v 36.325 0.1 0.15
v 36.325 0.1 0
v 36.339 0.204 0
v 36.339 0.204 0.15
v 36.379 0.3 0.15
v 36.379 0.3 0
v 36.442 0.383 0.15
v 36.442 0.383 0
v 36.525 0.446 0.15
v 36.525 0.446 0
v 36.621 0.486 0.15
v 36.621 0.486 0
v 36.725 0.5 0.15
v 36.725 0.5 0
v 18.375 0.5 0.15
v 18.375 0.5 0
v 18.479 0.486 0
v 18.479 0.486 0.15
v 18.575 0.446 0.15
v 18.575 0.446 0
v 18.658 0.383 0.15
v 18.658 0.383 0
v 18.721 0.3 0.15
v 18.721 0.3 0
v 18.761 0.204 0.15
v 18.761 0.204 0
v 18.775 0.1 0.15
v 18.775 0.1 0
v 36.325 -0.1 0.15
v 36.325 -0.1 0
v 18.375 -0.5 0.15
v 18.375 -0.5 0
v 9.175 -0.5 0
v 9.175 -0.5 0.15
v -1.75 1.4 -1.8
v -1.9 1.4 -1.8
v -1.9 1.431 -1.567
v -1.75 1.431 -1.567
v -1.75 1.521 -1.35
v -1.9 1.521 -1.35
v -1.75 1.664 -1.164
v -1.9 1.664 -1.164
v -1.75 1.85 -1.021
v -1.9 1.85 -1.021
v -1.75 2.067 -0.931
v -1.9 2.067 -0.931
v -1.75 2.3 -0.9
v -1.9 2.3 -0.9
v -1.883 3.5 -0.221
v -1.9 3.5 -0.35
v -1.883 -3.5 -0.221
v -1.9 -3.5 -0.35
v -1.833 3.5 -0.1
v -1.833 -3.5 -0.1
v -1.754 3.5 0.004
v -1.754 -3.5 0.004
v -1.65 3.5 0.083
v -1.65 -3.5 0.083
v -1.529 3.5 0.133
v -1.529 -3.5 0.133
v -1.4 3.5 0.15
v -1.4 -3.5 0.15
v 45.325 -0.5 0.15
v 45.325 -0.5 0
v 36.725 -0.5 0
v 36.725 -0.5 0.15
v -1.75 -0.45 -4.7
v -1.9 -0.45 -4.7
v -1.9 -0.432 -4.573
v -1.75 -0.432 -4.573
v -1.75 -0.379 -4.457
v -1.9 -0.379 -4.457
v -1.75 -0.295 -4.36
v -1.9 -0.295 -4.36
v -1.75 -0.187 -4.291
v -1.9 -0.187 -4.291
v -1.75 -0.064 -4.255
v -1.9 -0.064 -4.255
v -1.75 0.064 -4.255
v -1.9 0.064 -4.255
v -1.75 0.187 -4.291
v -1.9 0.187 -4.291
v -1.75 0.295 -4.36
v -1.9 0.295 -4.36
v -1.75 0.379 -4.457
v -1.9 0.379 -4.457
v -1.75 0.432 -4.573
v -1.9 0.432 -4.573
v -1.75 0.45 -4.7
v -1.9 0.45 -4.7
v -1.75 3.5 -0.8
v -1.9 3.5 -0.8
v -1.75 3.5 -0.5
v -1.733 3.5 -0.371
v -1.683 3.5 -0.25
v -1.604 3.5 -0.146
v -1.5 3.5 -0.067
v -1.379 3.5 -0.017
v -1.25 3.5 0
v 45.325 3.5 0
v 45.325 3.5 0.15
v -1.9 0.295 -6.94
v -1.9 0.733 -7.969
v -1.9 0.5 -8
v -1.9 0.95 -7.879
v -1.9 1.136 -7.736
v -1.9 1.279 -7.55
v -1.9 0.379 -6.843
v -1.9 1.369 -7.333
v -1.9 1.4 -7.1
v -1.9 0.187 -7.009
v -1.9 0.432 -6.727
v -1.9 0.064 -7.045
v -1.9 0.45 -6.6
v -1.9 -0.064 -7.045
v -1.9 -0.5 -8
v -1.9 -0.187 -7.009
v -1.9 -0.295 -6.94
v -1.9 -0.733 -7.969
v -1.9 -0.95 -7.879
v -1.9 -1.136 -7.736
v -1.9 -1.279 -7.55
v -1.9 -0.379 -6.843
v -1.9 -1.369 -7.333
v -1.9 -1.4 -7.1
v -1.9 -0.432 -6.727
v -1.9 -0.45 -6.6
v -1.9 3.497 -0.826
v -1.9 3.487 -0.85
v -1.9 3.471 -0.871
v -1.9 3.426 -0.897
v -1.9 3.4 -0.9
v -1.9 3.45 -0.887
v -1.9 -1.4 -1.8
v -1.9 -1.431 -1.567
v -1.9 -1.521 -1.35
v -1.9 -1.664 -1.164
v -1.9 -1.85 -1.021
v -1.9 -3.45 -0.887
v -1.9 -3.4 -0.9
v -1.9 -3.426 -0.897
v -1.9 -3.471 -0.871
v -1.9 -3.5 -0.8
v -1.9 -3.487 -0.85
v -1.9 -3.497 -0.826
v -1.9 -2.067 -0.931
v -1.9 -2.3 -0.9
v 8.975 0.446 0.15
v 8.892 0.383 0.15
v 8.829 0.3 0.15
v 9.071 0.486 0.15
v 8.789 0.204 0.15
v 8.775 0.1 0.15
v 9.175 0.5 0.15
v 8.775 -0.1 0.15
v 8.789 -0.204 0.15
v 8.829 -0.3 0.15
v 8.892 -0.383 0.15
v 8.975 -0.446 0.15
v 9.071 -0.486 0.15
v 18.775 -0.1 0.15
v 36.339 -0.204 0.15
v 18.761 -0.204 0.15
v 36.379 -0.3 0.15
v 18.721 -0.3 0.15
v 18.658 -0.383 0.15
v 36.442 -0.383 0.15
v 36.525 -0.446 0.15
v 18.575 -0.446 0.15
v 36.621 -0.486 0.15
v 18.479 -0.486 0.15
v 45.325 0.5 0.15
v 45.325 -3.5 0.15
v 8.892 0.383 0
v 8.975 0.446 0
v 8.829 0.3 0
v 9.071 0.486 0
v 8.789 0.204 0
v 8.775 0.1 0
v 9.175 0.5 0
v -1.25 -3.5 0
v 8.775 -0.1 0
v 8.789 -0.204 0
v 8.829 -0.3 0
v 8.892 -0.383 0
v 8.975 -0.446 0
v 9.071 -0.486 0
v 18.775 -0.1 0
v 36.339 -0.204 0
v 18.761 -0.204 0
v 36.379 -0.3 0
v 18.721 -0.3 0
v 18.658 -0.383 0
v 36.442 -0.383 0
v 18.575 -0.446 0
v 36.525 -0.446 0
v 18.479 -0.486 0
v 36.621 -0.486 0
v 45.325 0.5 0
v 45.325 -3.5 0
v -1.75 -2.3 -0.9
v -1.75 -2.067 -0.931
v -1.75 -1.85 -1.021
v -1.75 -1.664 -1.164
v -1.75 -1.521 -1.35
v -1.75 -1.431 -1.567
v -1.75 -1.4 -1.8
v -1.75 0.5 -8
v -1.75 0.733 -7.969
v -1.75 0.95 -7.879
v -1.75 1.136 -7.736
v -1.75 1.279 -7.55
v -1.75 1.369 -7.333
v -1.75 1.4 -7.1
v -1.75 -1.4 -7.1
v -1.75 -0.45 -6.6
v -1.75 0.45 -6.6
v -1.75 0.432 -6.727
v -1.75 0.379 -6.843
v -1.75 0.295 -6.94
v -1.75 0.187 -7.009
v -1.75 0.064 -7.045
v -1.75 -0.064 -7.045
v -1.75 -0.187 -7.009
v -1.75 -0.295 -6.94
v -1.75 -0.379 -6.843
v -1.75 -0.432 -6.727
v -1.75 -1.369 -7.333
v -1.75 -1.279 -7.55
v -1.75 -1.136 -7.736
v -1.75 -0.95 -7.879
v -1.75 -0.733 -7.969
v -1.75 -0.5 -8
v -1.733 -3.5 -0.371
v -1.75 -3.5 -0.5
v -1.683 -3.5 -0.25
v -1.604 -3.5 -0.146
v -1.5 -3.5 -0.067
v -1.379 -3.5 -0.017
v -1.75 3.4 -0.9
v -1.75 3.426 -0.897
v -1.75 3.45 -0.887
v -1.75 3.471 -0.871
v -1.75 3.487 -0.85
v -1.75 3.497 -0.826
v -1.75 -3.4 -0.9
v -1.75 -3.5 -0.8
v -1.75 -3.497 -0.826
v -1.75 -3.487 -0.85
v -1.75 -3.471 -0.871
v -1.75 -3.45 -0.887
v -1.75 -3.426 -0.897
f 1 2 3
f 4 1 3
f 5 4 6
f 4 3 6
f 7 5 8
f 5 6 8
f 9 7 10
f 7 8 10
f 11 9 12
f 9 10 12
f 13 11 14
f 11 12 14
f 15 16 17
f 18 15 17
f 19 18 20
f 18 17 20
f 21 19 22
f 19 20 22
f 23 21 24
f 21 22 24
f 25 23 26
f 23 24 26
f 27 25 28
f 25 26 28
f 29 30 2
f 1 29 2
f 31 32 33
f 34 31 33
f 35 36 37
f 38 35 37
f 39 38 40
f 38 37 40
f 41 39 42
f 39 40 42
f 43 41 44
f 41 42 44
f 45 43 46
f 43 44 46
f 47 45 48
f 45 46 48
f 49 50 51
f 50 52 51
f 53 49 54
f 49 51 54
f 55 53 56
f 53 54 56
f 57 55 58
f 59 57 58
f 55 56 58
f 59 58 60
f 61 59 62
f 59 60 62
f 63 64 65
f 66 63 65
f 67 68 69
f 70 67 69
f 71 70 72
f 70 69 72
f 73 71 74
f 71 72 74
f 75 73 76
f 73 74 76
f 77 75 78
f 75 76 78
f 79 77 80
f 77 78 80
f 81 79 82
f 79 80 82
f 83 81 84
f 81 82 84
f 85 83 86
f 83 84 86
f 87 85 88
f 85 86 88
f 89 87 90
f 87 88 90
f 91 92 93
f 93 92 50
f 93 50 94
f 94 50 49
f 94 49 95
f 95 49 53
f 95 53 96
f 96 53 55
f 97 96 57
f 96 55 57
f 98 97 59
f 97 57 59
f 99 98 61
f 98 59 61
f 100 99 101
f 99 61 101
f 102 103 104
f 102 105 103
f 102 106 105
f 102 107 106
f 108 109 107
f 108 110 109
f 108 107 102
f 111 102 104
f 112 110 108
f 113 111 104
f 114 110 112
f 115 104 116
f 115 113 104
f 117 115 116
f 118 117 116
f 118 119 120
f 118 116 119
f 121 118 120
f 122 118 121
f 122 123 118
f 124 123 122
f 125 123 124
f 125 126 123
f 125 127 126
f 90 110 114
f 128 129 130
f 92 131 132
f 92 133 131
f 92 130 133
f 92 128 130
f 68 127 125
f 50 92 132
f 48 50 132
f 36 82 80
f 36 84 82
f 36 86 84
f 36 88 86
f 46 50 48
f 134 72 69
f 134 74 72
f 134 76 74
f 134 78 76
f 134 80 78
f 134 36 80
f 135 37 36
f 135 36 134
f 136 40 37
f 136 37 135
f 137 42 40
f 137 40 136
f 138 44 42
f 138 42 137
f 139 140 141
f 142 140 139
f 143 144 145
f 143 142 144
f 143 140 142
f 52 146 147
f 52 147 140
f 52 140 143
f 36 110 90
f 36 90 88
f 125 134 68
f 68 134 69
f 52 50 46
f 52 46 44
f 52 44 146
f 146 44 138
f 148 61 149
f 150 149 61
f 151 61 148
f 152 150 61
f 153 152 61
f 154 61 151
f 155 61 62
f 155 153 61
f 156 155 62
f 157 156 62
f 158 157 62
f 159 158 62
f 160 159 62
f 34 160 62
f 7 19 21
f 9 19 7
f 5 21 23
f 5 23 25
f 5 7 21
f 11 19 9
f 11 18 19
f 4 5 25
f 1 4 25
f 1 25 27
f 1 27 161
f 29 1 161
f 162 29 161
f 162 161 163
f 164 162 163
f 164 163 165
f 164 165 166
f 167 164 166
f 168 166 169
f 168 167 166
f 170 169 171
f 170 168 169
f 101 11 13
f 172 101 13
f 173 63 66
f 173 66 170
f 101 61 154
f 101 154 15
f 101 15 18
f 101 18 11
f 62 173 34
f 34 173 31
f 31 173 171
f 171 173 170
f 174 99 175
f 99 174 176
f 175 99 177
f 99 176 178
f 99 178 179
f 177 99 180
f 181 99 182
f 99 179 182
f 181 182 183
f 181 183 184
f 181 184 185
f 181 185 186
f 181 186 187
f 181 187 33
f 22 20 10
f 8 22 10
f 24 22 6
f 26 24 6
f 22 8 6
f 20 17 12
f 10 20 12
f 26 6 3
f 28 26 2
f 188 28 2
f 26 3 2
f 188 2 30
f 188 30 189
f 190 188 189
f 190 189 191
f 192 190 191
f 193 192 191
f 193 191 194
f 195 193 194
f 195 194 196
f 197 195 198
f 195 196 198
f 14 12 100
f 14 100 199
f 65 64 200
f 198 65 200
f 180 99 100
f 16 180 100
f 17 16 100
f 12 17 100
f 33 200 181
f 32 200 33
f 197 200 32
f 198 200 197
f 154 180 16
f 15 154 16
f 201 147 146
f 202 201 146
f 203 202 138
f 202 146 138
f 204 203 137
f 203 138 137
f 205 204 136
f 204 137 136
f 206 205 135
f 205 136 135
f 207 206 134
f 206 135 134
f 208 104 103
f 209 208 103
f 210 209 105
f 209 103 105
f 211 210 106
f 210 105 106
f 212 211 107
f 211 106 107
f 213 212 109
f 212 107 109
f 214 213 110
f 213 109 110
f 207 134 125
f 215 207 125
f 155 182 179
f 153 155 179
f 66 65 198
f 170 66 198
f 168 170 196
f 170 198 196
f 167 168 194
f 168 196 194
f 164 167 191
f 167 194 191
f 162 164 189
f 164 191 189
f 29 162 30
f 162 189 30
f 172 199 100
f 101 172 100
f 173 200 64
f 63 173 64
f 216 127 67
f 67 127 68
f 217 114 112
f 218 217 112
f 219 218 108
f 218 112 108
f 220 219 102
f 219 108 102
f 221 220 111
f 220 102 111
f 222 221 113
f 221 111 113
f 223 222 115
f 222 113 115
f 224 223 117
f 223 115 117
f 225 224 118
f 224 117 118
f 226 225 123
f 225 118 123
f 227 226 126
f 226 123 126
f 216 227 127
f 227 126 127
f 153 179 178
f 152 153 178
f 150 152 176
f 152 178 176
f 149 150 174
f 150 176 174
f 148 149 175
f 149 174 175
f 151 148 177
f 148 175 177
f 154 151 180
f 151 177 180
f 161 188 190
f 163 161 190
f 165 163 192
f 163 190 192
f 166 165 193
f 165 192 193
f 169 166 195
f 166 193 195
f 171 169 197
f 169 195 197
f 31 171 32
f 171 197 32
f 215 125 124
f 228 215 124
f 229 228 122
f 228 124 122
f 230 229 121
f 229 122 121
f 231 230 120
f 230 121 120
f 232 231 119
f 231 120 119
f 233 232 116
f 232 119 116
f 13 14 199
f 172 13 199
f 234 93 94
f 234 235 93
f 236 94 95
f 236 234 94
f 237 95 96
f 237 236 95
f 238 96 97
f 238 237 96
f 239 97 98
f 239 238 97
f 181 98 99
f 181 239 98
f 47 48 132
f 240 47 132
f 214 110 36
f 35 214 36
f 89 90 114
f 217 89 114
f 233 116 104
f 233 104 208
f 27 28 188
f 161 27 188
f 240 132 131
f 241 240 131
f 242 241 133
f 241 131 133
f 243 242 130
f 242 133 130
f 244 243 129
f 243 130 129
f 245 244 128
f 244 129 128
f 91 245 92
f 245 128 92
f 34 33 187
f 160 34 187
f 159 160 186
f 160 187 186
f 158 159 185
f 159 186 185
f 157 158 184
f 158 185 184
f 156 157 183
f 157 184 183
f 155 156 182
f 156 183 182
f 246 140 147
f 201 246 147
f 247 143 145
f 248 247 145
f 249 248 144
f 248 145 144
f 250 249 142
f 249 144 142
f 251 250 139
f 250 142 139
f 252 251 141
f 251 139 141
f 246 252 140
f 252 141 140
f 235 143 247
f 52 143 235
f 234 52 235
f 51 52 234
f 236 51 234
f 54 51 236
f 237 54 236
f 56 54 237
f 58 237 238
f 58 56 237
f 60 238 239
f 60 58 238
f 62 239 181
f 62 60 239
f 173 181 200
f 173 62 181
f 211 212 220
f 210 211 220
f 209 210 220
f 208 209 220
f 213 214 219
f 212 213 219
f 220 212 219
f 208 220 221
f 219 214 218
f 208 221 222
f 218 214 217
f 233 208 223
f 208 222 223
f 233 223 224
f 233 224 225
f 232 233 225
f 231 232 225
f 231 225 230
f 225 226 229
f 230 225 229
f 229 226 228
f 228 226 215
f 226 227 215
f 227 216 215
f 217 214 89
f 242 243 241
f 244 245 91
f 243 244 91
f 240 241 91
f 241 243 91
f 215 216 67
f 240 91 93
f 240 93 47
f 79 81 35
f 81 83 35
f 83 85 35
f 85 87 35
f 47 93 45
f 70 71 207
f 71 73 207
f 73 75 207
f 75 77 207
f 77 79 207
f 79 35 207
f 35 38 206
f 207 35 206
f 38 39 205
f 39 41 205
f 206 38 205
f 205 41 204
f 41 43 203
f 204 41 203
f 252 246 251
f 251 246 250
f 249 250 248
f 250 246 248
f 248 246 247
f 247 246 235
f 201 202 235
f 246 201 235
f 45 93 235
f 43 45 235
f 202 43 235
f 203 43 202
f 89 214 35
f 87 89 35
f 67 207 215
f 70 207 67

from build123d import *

# Parameters (mm, degrees)
F0_W     = 4
F0_H     = 3
F1_DEPTH = 0.15
F2_DEPTH = 1.9
F3_W     = 0.15
F3_H     = 7
F4_DEPTH = 8
F6_DEPTH = 25
F7_R     = 0.5


# Not quite as in the source:
# - a feature names something its author has since deleted; it is built from what else it names


with BuildPart() as f1:
    # F0 (on Top) → F1 (new body)
    with BuildSketch(Plane.XY):
        with BuildLine():
            Line((13.775, -0.5), (13.775, -3.5))
            Line((13.775, -3.5), (27.55, -3.5))
            Line((27.55, -3.5), (41.325, -3.5))
            Line((41.325, -3.5), (41.325, -0.5))
            Line((41.325, -0.5), (36.725, -0.5))
            ThreePointArc((36.725, -0.5), (36.4421572875, -0.3828427125), (36.325, -0.1))
            Line((36.325, -0.1), (36.325, 0.1))
            ThreePointArc((36.325, 0.1), (36.4421572875, 0.3828427125), (36.725, 0.5))
            Line((36.725, 0.5), (41.325, 0.5))
            Line((41.325, 0.5), (41.325, 3.5))
            Line((41.325, 3.5), (27.55, 3.5))
            Line((27.55, 3.5), (13.775, 3.5))
            Line((13.775, 3.5), (13.775, 0.5))
            Line((13.775, 0.5), (18.375, 0.5))
            ThreePointArc((18.375, 0.5), (18.6578427125, 0.3828427125), (18.775, 0.1))
            Line((18.775, 0.1), (18.775, -0.1))
            ThreePointArc((18.775, -0.1), (18.6578427125, -0.3828427125), (18.375, -0.5))
            Line((18.375, -0.5), (13.775, -0.5))
        make_face()
        with Locations((43.325, 2)):
            Rectangle(F0_W, F0_H)
        with BuildLine():
            Line((0, 3.5), (0, -3.5))
            Line((0, -3.5), (13.775, -3.5))
            Line((13.775, -3.5), (13.775, -0.5))
            Line((13.775, -0.5), (9.175, -0.5))
            ThreePointArc((9.175, -0.5), (8.8921572875, -0.3828427125), (8.775, -0.1))
            Line((8.775, -0.1), (8.775, 0.1))
            ThreePointArc((8.775, 0.1), (8.8921572875, 0.3828427125), (9.175, 0.5))
            Line((9.175, 0.5), (13.775, 0.5))
            Line((13.775, 0.5), (13.775, 3.5))
            Line((13.775, 3.5), (0, 3.5))
        make_face()
        with Locations((43.325, -2)):
            Rectangle(F0_W, F0_H)
    extrude(amount=F1_DEPTH)

    # F2 (add): a face of the model
    f2_faces = [f1.faces().sort_by_distance(p)[0] for p in [
        (0, 0, 0.075),
    ]]
    extrude(f2_faces, amount=F2_DEPTH)

    # F3 (on face) → F4 (join)
    with BuildSketch(Plane(origin=(0, 0, 0), x_dir=(1, 0, 0), z_dir=(0, 0, -1))):
        with Locations((-1.825, 0)):
            Rectangle(F3_W, F3_H)
    extrude(amount=F4_DEPTH)

    # F5 (on face) → F6 (cut)
    with BuildSketch(Plane(origin=(-1.9, 0, 0), x_dir=(0, -1, 0), z_dir=(-1, 0, 0))):
        with BuildLine():
            Line((-3.5, -8), (-0.5, -8))
            ThreePointArc((-0.5, -8), (-1.1363961031, -7.7363961031), (-1.4, -7.1))
            Line((-1.4, -7.1), (-1.4, -1.8))
            ThreePointArc((-1.4, -1.8), (-1.6636038969, -1.1636038969), (-2.3, -0.9))
            Line((-2.3, -0.9), (-3.4, -0.9))
            ThreePointArc((-3.4, -0.9), (-3.4707106781, -0.8707106781), (-3.5, -0.8))
            Line((-3.5, -0.8), (-3.5, -8))
        make_face()
        with BuildLine():
            ThreePointArc((1.4, -7.1), (1.1363961031, -7.7363961031), (0.5, -8))
            Line((0.5, -8), (3.5, -8))
            Line((3.5, -8), (3.5, -0.8))
            ThreePointArc((3.5, -0.8), (3.4707106781, -0.8707106781), (3.4, -0.9))
            Line((3.4, -0.9), (2.3, -0.9))
            ThreePointArc((2.3, -0.9), (1.6636038969, -1.1636038969), (1.4, -1.8))
            Line((1.4, -1.8), (1.4, -7.1))
        make_face()
        with BuildLine():
            ThreePointArc((-0.45, -6.6), (0, -7.05), (0.45, -6.6))
            ThreePointArc((0.45, -6.6), (0, -6.15), (-0.45, -6.6))
        make_face()
        with BuildLine():
            ThreePointArc((-0.45, -6.6), (0, -6.15), (0.45, -6.6))
            Line((0.45, -6.6), (0.45, -4.7))
            ThreePointArc((0.45, -4.7), (0, -5.15), (-0.45, -4.7))
            Line((-0.45, -4.7), (-0.45, -6.6))
        make_face()
        with BuildLine():
            ThreePointArc((-0.45, -4.7), (0, -5.15), (0.45, -4.7))
            ThreePointArc((0.45, -4.7), (0, -4.25), (-0.45, -4.7))
        make_face()
    extrude(amount=-F6_DEPTH, mode=Mode.SUBTRACT)

    # F7
    f7_edges = [f1.edges().sort_by_distance(p)[0] for p in [
        (-1.9, 0, 0.15),
        (-1.75, 0, 0),
    ]]
    fillet(f7_edges, radius=F7_R)


solid = f1.part
